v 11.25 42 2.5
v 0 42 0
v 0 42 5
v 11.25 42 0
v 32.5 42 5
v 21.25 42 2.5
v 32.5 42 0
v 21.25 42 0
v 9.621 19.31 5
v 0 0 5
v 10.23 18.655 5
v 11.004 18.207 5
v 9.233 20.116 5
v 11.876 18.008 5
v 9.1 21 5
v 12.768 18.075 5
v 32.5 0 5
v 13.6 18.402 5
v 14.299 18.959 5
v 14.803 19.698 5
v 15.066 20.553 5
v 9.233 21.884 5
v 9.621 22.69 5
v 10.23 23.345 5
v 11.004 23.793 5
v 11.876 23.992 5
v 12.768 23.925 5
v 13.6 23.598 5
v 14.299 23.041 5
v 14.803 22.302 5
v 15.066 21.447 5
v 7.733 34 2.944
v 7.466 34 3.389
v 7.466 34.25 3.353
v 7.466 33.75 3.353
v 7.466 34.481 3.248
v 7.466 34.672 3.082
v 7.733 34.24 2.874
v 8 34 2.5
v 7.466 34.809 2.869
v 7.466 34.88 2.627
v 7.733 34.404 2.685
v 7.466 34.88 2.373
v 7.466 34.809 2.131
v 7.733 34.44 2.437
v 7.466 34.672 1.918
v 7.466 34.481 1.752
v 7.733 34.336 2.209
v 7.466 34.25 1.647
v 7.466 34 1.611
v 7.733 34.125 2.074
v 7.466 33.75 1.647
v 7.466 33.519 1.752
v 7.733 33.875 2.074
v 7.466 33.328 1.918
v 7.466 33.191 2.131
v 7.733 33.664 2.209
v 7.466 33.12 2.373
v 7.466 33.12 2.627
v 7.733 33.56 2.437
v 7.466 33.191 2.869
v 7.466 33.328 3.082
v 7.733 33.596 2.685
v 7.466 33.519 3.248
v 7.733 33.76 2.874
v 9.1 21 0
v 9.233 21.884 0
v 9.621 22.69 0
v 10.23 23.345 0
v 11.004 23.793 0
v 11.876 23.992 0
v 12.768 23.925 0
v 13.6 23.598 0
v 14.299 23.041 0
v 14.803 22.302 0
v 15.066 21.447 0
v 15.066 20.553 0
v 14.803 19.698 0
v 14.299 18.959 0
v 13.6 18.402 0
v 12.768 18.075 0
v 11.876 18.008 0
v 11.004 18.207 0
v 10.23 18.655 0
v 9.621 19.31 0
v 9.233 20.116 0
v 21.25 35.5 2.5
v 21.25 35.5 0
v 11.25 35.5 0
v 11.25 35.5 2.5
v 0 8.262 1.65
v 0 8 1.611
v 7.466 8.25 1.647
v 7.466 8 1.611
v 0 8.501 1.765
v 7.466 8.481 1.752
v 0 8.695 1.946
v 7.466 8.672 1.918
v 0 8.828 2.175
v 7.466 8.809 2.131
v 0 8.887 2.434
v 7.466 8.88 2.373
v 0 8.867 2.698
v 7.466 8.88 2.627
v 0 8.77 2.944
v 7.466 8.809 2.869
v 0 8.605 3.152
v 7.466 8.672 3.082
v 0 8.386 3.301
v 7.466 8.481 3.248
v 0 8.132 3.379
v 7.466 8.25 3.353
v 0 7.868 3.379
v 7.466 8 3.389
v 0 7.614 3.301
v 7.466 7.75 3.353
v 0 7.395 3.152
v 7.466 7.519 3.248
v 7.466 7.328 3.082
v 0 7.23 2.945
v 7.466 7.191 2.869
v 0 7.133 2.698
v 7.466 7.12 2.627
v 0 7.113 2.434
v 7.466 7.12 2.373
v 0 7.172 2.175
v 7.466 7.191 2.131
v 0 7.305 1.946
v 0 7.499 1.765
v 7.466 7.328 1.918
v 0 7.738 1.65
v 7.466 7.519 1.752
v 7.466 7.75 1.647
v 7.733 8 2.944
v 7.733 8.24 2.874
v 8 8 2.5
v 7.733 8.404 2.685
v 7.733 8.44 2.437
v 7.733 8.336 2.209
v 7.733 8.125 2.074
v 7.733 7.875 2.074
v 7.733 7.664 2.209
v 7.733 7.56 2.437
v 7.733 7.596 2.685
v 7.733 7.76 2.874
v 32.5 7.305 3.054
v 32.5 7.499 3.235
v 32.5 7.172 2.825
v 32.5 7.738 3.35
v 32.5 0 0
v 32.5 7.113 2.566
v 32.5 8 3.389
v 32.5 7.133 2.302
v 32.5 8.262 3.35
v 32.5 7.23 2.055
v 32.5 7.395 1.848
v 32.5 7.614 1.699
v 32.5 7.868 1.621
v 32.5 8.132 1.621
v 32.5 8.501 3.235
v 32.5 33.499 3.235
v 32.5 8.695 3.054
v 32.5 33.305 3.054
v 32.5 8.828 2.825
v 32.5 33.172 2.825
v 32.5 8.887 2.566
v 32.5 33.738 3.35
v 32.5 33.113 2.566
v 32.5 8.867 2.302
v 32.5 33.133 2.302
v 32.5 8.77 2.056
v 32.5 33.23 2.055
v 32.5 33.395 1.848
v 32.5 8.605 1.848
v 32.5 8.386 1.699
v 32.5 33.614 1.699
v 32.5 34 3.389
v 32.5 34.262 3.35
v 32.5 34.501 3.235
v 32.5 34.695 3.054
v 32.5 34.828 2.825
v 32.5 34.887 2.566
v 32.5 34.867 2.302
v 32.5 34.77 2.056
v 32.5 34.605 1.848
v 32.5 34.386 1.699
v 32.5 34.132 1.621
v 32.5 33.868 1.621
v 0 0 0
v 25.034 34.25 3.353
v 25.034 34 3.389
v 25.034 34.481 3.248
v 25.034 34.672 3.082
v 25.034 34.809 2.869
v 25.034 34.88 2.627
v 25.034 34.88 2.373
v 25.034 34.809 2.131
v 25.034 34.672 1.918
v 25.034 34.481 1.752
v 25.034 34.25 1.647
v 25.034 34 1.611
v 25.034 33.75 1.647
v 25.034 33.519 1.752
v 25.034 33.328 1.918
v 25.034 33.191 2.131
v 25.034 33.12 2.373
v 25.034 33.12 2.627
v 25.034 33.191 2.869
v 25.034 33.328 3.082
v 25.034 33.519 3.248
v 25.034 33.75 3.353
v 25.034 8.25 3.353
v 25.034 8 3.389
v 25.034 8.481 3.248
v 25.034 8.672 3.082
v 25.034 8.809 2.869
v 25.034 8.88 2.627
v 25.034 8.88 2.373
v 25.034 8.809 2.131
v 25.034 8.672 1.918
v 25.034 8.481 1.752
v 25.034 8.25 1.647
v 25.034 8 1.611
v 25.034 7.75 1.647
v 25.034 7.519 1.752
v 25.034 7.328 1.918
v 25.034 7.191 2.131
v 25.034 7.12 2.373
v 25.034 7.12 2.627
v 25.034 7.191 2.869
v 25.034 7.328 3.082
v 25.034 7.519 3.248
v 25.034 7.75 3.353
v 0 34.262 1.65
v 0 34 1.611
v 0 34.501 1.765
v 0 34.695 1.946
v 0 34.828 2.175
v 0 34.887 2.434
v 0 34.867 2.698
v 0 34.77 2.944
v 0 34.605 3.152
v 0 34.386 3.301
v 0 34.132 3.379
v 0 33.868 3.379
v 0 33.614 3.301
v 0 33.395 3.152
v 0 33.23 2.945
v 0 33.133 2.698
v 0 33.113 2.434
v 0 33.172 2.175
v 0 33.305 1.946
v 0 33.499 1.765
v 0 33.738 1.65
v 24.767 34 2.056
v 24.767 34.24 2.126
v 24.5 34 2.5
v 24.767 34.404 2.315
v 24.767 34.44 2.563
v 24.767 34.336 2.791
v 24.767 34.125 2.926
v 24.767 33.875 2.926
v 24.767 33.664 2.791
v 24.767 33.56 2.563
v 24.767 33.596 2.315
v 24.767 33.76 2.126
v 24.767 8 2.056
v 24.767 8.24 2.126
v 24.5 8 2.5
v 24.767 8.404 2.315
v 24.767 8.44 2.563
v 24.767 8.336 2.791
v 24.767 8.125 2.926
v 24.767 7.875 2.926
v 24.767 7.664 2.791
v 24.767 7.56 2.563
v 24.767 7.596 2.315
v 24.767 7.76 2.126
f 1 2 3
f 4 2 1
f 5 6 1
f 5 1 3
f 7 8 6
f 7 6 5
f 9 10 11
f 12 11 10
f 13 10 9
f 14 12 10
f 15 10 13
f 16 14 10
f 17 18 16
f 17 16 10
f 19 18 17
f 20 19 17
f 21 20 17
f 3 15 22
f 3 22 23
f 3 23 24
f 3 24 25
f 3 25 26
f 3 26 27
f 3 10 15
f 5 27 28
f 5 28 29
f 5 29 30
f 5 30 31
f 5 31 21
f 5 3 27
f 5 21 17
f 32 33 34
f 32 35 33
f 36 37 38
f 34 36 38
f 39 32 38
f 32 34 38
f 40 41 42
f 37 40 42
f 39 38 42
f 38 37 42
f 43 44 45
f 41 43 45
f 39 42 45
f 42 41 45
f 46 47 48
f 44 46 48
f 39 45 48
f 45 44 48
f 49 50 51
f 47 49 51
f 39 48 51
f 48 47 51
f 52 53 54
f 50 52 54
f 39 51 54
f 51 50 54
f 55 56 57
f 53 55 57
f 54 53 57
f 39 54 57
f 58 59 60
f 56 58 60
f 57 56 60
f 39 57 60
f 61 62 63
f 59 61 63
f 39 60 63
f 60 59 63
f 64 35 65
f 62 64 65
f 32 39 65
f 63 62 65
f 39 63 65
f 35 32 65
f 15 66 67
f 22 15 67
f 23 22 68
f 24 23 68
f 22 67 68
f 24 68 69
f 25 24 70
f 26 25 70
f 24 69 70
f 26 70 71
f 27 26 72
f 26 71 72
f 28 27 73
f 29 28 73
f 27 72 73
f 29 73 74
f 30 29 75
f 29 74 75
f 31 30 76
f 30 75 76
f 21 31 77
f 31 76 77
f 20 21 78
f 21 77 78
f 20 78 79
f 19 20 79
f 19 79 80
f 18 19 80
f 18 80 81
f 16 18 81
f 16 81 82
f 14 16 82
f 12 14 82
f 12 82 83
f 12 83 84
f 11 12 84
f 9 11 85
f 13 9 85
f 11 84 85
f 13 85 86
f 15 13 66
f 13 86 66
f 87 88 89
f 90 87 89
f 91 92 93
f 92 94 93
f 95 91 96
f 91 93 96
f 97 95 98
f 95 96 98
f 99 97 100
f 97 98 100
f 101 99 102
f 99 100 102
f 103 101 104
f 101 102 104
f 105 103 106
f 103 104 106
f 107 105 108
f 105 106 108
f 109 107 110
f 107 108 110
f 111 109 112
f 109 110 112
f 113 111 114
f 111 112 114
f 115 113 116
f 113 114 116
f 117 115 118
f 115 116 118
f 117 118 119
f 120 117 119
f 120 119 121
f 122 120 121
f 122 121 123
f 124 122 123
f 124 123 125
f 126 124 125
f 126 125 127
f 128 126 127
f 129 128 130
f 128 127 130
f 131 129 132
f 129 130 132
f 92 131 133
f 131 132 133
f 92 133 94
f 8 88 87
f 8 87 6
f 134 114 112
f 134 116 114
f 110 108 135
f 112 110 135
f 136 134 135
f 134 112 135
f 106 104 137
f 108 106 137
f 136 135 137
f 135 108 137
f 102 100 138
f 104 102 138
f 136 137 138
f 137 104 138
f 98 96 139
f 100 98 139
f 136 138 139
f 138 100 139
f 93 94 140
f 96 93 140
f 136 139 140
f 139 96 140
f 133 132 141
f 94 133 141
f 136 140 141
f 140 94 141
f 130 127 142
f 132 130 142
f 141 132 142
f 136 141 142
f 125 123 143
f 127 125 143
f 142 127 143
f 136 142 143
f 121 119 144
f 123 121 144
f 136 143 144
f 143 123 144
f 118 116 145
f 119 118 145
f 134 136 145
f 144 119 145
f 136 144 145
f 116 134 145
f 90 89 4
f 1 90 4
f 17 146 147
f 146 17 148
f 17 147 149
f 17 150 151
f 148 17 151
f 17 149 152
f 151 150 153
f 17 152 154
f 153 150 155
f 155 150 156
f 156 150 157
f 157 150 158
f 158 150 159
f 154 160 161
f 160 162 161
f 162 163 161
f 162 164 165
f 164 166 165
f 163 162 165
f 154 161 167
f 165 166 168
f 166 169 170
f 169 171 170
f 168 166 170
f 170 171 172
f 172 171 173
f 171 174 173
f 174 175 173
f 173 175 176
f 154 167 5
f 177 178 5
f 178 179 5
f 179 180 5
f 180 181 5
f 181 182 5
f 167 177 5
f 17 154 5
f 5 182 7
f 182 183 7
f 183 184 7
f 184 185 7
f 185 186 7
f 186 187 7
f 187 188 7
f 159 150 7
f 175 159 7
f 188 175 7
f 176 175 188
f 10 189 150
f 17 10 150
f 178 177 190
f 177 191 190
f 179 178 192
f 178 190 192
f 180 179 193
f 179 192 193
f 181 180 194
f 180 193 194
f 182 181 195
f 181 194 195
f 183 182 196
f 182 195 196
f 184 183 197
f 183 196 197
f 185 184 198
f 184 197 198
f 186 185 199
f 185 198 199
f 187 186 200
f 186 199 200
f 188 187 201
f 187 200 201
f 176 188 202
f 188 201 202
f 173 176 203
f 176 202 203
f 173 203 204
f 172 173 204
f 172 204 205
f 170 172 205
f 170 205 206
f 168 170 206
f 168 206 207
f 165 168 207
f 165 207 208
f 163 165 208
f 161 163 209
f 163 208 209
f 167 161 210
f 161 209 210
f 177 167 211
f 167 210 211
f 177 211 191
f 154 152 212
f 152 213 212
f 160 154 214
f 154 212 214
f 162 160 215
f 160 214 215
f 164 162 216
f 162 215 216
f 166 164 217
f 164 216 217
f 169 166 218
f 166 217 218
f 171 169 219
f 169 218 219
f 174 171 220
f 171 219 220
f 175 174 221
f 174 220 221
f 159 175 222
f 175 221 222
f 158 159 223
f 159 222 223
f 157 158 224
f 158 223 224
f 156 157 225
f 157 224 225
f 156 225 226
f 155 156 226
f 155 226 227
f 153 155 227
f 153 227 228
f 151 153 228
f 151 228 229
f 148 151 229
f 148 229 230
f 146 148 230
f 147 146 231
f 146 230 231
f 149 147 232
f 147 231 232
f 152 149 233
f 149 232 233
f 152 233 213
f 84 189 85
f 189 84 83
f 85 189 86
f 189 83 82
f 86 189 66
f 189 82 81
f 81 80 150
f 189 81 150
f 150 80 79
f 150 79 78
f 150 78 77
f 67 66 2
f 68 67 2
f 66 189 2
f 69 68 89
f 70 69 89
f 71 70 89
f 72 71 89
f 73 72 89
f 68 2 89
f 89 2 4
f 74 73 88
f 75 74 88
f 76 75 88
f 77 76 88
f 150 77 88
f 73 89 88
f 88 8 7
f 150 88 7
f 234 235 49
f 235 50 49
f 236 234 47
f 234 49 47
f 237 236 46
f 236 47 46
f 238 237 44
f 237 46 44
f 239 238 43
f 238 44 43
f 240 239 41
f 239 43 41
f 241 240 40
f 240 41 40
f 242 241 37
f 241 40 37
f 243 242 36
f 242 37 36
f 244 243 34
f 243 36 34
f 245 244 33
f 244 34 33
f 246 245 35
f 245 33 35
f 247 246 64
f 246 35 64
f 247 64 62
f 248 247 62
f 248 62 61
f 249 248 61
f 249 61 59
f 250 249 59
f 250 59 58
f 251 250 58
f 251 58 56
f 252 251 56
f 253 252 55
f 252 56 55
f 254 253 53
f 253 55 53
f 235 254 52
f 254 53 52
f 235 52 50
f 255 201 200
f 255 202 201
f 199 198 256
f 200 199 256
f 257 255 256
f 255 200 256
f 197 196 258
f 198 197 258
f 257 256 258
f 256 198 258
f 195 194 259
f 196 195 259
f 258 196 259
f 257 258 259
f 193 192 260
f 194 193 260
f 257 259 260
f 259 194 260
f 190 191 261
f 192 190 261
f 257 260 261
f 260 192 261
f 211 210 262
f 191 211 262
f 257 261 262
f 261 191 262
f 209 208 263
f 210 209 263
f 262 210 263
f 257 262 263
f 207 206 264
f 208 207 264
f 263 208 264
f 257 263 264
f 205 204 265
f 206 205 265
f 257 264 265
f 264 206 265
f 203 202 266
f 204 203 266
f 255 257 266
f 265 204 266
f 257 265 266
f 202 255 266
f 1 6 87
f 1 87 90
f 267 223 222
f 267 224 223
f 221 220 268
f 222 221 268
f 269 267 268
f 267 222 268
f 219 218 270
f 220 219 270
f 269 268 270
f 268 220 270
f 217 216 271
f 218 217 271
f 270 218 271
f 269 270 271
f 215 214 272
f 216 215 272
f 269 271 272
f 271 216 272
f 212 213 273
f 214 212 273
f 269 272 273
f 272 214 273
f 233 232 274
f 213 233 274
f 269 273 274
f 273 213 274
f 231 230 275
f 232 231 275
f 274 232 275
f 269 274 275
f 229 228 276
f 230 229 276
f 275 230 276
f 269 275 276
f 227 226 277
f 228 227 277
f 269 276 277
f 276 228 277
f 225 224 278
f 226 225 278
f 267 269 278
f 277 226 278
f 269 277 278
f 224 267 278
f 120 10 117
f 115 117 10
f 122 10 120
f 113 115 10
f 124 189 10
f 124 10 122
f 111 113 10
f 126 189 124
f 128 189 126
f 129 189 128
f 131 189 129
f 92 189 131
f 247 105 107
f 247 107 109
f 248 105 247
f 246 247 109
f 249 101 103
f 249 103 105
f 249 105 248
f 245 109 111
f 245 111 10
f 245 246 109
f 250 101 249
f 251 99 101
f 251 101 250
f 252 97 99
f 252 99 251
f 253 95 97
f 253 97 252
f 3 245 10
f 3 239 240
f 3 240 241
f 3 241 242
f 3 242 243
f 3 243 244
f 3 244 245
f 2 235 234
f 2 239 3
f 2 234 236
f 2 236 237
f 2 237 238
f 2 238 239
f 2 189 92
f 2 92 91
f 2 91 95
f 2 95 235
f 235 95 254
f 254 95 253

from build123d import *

# Parameters (mm, degrees)
SKETCH1_W                 = 32.5
SKETCH1_H                 = 42
BOSS_EXTRUDE2_DEPTH       = 5
F_2_56_TAPPED_HOLE1_D     = 1.778
F_2_56_TAPPED_HOLE1_DEPTH = 7.46583491
F_2_56_TAPPED_HOLE1_TIP   = 0.53416509
F_2_56_TAPPED_HOLE2_D     = 1.778
F_2_56_TAPPED_HOLE2_DEPTH = 7.46583491
F_2_56_TAPPED_HOLE2_TIP   = 0.53416509
CUT_EXTRUDE1_DEPTH        = 5
SKETCH10_W                = 10
SKETCH10_H                = 6.5
CUT_EXTRUDE2_DEPTH        = 2.5


with BuildPart() as part:
    # Sketch1 → Boss-Extrude2 (new body)
    with BuildSketch(Plane.XY):
        with Locations((16.25, 21)):
            Rectangle(SKETCH1_W, SKETCH1_H)
    extrude(amount=BOSS_EXTRUDE2_DEPTH)

    # #2-56 Tapped Hole1
    with Locations(Plane.ZY):
        with Locations((2.5, 34), (2.5, 8)):
            Hole(F_2_56_TAPPED_HOLE1_D / 2, depth=F_2_56_TAPPED_HOLE1_DEPTH)
            with Locations((0, 0, -(F_2_56_TAPPED_HOLE1_DEPTH + F_2_56_TAPPED_HOLE1_TIP / 2))):  # 118° drill point
                Cone(0, F_2_56_TAPPED_HOLE1_D / 2, F_2_56_TAPPED_HOLE1_TIP, mode=Mode.SUBTRACT)

    # #2-56 Tapped Hole2
    with Locations(Plane(origin=(32.5, 0, 0), x_dir=(0, 0, -1), z_dir=(1, 0, 0))):
        with Locations((-2.5, 34), (-2.5, 8)):
            Hole(F_2_56_TAPPED_HOLE2_D / 2, depth=F_2_56_TAPPED_HOLE2_DEPTH)
            with Locations((0, 0, -(F_2_56_TAPPED_HOLE2_DEPTH + F_2_56_TAPPED_HOLE2_TIP / 2))):  # 118° drill point
                Cone(0, F_2_56_TAPPED_HOLE2_D / 2, F_2_56_TAPPED_HOLE2_TIP, mode=Mode.SUBTRACT)

    # Sketch9 → Cut-Extrude1 (cut)
    with BuildSketch(Plane(origin=(0, 0, 0), x_dir=(-1, 0, 0), z_dir=(0, 0, -1))):
        with BuildLine():
            ThreePointArc((-15.1, 21), (-12.1, 18), (-9.1, 21))
            Line((-9.1, 21), (-12.1, 21))
            Line((-12.1, 21), (-15.1, 21))
        make_face()
        with BuildLine():
            Line((-12.1, 21), (-9.1, 21))
            ThreePointArc((-9.1, 21), (-12.1, 24), (-15.1, 21))
            Line((-15.1, 21), (-12.1, 21))
        make_face()
    extrude(amount=-CUT_EXTRUDE1_DEPTH, mode=Mode.SUBTRACT)

    # Sketch10 → Cut-Extrude2 (cut)
    with BuildSketch(Plane(origin=(0, 0, 0), x_dir=(-1, 0, 0), z_dir=(0, 0, -1))):
        with Locations((-16.25, 38.75)):
            Rectangle(SKETCH10_W, SKETCH10_H)
    extrude(amount=-CUT_EXTRUDE2_DEPTH, mode=Mode.SUBTRACT)


solid = part.part
